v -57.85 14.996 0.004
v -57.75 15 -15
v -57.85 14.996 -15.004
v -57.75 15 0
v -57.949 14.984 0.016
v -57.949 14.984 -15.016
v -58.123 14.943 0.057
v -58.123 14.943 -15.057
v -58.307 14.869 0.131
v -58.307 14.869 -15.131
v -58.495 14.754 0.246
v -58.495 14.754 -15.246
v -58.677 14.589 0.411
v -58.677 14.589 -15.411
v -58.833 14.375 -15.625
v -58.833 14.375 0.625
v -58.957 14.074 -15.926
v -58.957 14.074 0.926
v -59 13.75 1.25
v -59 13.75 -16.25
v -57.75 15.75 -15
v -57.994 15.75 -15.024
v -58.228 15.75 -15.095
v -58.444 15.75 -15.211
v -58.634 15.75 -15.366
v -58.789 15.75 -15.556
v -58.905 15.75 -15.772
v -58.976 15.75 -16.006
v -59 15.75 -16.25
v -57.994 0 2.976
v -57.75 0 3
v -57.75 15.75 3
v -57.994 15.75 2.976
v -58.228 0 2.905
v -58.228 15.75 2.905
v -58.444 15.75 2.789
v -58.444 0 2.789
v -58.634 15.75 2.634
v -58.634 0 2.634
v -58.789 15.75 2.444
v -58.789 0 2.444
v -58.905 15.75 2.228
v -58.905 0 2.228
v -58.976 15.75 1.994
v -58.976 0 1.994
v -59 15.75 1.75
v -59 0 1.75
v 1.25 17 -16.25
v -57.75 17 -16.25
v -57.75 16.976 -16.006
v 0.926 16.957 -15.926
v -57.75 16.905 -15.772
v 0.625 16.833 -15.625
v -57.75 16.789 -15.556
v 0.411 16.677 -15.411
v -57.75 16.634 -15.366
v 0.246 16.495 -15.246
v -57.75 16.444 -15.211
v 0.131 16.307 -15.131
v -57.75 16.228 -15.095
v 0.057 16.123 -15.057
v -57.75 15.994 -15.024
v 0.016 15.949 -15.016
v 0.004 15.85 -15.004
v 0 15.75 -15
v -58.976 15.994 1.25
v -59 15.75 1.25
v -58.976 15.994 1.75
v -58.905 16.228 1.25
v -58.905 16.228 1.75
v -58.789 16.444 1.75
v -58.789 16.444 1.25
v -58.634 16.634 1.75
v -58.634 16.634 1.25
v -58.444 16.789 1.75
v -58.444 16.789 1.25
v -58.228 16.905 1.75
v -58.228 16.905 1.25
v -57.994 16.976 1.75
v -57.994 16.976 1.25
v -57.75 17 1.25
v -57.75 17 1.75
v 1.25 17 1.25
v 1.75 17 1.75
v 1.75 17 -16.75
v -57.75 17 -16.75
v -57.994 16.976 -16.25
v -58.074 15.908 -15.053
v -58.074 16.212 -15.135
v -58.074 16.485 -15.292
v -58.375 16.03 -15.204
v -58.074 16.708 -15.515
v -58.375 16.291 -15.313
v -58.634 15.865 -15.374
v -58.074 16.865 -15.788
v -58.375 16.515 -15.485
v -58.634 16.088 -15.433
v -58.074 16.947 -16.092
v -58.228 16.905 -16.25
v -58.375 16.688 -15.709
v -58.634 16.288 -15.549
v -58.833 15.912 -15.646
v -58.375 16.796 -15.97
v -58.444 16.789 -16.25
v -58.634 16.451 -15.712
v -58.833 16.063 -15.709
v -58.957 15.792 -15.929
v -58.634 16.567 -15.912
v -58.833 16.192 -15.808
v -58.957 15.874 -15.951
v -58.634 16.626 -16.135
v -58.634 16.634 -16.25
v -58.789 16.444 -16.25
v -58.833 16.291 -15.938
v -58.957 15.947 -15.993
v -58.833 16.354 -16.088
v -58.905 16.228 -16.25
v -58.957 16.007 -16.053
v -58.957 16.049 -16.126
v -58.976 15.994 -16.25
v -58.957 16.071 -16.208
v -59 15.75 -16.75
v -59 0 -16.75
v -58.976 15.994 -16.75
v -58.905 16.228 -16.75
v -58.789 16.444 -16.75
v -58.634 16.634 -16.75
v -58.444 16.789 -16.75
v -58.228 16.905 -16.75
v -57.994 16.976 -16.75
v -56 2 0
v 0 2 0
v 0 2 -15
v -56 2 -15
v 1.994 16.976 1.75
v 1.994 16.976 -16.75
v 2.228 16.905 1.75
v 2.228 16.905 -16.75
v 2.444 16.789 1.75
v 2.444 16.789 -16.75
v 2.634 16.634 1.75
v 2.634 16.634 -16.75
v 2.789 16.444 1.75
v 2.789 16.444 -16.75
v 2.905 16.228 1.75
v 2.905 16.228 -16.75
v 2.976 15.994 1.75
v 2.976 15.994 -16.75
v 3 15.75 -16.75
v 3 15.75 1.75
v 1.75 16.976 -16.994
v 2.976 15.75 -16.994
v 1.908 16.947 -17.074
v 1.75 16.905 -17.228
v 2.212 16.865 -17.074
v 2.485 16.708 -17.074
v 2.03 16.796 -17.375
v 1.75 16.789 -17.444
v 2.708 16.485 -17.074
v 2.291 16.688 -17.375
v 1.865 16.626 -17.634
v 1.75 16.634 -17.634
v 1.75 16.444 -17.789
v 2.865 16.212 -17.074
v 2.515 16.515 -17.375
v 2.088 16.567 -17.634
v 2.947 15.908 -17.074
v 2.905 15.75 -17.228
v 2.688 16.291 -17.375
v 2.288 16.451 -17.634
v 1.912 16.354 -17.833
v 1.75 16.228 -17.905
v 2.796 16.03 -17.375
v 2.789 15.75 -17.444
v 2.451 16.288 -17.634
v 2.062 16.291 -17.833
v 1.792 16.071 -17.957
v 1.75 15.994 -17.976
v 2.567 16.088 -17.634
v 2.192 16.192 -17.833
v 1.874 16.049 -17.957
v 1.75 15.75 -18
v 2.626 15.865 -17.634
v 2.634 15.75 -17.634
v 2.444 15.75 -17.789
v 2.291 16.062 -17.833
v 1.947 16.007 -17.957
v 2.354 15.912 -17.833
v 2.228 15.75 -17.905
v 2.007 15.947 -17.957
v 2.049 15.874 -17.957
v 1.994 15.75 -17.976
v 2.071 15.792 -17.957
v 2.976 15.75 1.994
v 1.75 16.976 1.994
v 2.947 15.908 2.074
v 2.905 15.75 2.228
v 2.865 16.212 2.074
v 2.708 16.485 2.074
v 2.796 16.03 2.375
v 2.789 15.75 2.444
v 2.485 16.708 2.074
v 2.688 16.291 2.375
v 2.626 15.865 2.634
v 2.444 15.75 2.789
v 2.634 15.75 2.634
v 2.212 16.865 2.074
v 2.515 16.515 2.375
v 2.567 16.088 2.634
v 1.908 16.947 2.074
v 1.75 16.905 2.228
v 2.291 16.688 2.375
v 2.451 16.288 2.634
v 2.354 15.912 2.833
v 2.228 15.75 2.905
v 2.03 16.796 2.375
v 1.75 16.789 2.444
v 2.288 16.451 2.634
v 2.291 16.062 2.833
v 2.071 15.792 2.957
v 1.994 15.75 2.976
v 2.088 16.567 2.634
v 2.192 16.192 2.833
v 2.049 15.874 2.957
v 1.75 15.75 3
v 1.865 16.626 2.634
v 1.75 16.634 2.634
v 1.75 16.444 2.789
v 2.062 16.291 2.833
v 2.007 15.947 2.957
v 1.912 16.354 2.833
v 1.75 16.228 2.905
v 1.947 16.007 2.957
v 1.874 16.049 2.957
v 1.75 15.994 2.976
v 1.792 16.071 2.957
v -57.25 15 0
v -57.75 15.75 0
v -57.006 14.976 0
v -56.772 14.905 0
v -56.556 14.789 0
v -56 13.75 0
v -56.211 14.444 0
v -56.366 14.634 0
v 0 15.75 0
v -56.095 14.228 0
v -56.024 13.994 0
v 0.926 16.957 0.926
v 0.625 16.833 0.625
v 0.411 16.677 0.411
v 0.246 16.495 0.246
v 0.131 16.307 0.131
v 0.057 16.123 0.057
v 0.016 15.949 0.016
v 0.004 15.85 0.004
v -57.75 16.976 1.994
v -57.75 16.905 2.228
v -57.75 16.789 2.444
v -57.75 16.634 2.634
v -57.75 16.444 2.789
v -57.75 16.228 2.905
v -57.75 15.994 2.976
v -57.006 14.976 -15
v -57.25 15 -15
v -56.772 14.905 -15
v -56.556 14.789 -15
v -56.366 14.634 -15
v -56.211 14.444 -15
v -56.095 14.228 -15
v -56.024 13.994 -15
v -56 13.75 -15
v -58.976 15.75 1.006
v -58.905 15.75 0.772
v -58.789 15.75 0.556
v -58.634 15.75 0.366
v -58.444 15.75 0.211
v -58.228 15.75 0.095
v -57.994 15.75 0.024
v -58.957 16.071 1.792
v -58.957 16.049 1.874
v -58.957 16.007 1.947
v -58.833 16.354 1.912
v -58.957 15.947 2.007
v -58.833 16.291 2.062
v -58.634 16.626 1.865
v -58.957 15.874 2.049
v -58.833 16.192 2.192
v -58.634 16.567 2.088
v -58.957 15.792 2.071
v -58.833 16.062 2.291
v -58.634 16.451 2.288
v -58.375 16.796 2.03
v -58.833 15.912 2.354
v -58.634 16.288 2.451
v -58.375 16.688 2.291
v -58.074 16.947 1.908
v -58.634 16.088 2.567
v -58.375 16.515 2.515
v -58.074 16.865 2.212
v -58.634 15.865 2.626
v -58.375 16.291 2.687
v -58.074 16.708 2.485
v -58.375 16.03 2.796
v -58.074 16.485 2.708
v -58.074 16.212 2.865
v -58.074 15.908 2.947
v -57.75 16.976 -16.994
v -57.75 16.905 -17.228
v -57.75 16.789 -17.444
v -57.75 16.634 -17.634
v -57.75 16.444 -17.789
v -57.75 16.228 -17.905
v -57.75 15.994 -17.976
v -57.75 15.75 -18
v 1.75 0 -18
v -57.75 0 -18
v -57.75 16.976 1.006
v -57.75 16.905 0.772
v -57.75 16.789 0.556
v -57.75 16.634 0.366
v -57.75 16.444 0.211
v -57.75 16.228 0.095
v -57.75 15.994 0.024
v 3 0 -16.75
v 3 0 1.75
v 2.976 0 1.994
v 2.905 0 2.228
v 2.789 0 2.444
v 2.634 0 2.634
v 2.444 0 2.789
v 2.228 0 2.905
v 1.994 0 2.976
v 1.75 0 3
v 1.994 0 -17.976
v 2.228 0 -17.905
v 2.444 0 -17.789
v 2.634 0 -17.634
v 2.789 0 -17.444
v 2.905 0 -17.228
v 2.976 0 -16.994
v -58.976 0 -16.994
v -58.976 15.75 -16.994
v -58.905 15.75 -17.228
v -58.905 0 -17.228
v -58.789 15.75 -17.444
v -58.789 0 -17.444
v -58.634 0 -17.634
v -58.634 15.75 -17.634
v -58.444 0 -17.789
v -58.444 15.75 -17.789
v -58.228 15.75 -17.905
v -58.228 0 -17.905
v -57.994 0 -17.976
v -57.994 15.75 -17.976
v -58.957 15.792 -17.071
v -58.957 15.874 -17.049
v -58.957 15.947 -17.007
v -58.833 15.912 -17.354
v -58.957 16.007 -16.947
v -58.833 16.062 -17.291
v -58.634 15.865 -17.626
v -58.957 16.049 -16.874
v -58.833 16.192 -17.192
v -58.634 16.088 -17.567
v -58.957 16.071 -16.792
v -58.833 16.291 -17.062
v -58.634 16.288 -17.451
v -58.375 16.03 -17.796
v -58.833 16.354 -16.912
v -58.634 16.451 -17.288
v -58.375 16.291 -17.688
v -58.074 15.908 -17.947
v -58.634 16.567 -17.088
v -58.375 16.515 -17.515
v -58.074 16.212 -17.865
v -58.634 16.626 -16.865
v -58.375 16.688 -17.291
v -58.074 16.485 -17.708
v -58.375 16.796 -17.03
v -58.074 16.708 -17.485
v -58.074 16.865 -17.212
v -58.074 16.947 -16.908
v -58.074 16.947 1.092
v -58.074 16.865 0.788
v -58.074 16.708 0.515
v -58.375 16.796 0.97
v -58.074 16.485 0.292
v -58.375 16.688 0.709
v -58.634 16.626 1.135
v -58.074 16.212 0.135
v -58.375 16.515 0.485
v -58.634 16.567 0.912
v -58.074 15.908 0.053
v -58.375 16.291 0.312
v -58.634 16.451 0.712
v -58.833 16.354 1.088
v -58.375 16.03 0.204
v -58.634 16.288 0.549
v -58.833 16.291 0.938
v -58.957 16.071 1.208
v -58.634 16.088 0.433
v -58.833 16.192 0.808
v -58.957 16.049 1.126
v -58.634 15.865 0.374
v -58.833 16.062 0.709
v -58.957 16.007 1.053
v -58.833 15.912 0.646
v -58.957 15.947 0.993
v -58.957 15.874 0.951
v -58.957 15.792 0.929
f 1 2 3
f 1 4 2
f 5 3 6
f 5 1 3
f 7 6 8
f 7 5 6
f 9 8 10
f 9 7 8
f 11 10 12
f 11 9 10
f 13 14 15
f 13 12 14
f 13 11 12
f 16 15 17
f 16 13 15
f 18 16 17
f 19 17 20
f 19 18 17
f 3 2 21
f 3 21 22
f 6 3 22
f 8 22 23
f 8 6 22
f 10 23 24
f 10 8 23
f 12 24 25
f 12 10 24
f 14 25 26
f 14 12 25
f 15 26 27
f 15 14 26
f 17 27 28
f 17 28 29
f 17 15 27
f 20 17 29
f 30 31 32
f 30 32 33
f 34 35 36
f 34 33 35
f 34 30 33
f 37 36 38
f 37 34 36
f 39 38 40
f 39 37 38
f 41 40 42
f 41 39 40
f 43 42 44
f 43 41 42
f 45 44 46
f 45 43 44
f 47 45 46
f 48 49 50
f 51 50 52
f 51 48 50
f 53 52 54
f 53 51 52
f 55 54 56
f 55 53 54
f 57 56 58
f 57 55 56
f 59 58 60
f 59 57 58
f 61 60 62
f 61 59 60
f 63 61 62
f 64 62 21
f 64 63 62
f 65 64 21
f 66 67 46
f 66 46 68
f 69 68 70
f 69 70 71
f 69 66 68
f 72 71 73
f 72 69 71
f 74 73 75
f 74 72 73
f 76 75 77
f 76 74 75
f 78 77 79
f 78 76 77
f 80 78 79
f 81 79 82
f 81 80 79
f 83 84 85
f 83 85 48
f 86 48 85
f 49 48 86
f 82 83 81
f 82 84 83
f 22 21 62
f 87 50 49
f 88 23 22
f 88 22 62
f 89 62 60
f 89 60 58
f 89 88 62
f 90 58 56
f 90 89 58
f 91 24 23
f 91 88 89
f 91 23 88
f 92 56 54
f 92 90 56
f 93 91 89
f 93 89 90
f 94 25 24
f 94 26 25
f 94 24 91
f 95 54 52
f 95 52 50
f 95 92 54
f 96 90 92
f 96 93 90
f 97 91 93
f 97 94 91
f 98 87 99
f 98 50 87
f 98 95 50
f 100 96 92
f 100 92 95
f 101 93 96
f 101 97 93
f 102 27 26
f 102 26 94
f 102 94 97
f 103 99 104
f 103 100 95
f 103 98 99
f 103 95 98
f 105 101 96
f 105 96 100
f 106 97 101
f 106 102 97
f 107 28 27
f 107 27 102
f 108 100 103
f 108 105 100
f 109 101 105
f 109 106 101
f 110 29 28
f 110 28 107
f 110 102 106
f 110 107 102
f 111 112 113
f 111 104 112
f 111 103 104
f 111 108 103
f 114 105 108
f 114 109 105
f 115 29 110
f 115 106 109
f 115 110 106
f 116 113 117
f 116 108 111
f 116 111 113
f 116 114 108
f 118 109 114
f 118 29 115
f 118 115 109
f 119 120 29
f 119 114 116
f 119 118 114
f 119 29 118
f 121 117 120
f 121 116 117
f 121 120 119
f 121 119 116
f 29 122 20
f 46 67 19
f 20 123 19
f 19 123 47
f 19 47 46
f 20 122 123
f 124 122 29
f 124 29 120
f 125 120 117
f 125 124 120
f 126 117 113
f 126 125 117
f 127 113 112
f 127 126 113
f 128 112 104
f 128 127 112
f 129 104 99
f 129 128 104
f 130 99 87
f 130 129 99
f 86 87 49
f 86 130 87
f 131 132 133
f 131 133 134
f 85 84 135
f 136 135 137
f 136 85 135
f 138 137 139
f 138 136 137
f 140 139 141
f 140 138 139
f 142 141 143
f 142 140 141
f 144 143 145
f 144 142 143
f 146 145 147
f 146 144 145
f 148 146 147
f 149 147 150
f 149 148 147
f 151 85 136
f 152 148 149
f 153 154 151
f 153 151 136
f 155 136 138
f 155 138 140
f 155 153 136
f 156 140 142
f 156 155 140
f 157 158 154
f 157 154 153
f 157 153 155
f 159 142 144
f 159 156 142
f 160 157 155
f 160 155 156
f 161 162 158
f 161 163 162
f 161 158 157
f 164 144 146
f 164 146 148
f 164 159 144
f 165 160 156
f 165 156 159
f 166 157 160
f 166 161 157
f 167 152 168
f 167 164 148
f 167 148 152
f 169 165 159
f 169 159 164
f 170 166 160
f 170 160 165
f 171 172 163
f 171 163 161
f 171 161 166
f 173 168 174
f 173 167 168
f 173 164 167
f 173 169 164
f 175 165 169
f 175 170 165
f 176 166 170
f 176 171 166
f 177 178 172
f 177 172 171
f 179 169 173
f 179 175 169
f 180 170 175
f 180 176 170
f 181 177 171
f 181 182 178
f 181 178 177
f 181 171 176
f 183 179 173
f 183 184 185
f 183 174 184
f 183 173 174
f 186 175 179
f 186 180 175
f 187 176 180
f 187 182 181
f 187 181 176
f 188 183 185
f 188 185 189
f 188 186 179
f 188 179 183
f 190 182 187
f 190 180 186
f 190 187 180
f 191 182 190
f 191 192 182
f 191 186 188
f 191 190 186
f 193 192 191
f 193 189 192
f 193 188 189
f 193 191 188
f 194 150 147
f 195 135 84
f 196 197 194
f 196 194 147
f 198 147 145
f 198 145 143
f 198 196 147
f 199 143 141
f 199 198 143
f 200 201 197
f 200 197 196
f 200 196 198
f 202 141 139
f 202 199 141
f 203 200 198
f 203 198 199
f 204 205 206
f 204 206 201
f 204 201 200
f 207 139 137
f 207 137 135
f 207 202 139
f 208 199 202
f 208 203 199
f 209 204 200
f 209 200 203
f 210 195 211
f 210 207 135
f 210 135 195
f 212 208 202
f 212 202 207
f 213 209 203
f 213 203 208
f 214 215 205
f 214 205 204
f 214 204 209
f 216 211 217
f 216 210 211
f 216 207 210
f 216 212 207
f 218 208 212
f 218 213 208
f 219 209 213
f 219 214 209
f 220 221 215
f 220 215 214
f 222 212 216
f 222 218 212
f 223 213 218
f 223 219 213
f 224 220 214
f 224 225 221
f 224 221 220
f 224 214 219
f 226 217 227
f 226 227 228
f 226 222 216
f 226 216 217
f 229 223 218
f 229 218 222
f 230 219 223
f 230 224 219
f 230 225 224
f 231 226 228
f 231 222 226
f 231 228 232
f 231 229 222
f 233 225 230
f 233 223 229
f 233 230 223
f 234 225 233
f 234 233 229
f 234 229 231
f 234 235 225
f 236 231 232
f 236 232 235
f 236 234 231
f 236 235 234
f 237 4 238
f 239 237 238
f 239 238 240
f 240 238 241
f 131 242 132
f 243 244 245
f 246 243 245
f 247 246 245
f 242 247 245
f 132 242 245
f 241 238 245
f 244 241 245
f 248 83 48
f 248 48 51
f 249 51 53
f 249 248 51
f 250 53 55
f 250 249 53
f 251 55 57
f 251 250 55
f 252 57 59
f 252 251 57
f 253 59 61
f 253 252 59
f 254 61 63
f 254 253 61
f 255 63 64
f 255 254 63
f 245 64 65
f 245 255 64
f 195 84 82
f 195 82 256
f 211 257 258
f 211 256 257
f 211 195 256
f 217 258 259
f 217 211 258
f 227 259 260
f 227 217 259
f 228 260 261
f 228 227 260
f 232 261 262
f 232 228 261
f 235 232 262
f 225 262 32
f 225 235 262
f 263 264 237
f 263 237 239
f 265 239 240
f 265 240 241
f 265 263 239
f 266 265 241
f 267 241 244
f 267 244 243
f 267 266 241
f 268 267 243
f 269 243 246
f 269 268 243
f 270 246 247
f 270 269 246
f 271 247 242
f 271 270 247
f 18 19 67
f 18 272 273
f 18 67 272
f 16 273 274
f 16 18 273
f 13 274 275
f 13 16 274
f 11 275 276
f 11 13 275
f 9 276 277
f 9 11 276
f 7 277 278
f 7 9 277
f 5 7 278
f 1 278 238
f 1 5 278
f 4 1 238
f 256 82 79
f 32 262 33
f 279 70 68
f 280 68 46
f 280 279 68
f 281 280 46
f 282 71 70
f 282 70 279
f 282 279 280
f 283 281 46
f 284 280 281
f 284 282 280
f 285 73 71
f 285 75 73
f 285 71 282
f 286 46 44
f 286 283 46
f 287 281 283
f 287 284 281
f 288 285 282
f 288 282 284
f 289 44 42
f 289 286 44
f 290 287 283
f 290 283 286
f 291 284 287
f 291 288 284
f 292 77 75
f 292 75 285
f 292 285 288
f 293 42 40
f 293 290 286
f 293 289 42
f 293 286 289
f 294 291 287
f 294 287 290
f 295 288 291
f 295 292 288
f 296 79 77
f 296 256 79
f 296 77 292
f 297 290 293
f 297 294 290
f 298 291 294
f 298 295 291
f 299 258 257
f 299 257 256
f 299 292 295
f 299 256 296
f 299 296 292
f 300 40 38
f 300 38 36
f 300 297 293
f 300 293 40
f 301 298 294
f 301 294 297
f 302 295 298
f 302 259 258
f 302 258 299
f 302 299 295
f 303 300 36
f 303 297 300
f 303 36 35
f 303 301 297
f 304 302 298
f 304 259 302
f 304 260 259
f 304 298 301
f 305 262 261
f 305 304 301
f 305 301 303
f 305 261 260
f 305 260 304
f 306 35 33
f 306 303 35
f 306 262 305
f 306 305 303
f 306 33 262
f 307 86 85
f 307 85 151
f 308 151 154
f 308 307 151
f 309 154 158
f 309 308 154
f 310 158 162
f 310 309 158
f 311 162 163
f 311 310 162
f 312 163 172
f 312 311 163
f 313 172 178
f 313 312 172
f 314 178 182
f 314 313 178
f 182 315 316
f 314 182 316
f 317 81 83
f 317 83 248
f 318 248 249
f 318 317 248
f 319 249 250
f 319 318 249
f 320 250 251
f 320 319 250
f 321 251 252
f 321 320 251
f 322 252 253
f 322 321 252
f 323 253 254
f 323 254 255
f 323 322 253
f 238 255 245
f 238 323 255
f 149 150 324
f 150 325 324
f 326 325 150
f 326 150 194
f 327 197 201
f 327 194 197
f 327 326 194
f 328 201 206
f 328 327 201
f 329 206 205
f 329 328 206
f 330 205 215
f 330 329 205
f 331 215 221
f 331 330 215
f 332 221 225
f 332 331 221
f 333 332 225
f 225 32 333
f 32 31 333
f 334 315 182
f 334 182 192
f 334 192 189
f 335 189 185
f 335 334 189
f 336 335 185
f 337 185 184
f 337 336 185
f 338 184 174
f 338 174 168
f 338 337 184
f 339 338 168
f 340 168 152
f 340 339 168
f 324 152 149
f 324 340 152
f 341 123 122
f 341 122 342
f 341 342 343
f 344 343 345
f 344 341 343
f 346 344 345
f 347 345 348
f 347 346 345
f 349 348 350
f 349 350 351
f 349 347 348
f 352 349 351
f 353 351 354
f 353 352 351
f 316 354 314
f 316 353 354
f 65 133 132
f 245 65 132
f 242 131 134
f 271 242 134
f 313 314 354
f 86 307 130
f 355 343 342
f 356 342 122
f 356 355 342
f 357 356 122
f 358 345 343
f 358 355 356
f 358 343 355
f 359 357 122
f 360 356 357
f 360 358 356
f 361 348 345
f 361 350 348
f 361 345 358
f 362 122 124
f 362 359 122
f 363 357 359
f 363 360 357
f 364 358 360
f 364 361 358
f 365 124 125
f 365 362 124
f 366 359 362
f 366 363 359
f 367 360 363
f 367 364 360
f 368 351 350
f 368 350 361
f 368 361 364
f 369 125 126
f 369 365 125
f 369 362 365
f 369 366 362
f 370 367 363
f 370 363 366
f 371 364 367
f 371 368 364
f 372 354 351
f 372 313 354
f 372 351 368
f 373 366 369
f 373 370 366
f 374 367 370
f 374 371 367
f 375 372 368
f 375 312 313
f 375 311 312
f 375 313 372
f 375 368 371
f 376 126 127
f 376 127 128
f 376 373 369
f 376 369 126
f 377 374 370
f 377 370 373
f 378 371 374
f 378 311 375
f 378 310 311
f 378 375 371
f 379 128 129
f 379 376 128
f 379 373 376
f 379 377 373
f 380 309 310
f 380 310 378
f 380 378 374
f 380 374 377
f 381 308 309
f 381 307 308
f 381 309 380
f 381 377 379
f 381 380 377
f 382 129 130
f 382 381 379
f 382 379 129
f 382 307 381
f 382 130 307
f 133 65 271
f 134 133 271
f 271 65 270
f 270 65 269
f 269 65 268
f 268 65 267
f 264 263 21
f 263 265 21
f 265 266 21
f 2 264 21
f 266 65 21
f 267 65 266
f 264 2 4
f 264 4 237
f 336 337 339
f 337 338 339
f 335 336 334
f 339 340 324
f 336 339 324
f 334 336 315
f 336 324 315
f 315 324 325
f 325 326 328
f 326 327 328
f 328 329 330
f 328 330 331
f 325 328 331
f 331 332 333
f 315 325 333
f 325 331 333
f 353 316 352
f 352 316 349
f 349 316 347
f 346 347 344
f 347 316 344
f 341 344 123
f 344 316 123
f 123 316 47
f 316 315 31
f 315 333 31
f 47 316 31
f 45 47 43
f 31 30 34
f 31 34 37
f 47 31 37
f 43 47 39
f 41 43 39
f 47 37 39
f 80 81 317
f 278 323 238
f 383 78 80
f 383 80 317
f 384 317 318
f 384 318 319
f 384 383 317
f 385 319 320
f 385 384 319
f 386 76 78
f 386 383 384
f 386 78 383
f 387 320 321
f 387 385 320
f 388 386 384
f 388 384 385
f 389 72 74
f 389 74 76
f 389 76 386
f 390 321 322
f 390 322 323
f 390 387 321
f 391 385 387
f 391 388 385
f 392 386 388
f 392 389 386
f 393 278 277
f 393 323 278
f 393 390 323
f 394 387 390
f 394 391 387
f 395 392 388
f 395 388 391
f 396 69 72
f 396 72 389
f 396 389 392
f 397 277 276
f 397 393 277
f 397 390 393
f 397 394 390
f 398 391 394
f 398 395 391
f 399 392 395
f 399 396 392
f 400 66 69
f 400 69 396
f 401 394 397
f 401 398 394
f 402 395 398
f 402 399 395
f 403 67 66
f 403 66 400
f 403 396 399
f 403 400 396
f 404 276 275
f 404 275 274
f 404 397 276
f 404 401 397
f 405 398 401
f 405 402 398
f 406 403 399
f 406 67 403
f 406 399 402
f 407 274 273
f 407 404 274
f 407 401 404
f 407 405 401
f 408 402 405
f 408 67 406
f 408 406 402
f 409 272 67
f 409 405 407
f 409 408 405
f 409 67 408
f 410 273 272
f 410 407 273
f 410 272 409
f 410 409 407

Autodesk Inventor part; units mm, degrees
ref_plane "YZ Plane" through (0, 0, 0) normal (1, 0, 0) x (0, 1, 0)
ref_plane "XZ Plane" through (0, 0, 0) normal (0, 1, 0) x (-1, 0, 0)
ref_plane "XY Plane" through (0, 0, 0) normal (0, 0, 1) x (1, 0, 0)
sketch "Sketch1" plane through (0, 0, 0) normal (0, 1, 0) x (-1, 0, 0)
  line L0 (0, 0) -> (56, 0)
  line L1 (56, 0) -> (56, -15)
  line L2 (56, -15) -> (0, -15)
  line L3 (0, -15) -> (0, 0)
  line L4 (59, 3) -> (-3, 3)
  line L5 (-3, 3) -> (-3, -18)
  line L6 (-3, -18) -> (59, -18)
  line L7 (59, -18) -> (59, 3)
  dimension "d0" = 56
  dimension "d1" = 15
  dimension "d2" = 3
  dimension "d3" = 3
  dimension "d4" = 3
  dimension "d5" = 3
extrude "Extrusion1" add sketch "Sketch1" along normal blind 2 contours L0 L1 L2 L3
extrude "Extrusion2" add sketch "Sketch1" along normal blind 17
sketch "Sketch2" plane through (0, 17, 0) normal (0, 1, 0) x (1, 0, 0)
  line L0 (-56, 15) -> (0, 15) projected
  line L1 (-59, 18) -> (-59, -3) projected
  line L2 (-56, 15) -> (-59, 15)
  line L3 (-59, 15) -> (-59, 0)
  line L4 (-59, 0) -> (-56, 0)
  line L5 (-56, 0) -> (-56, 15)
  point P0 (0, 0)
extrude "Extrusion3" cut sketch "Sketch2" against normal blind 2
fillet "Fillet1" radius 1.25 10 edges at (-29.5, 17, -15) (-29.5, 17, 0) (-28, 17, -18) (-28, 17, 3) (0, 17, -7.5) (3, 17, -7.5) (-59, 15, -7.5) (-56, 15, -7.5) (-59, 16, -15) (-59, 16, 0)
fillet "Fillet2" radius 1.25 12 edges at (-59, 16.6339, 2.6339) (-59, 17, 1.5) (-58.6339, 16.6339, 0.3661) (-59, 7.875, 3) (-59, 16.6339, -17.6339) (-59, 17, -16.5) (-58.6339, 16.6339, -15.3661) (-59, 7.875, -18) (2.6339, 16.6339, 2.6339) (3, 7.875, 3) (2.6339, 16.6339, -17.6339) (3, 7.875, -18)
properties part number "battery_compartment"
